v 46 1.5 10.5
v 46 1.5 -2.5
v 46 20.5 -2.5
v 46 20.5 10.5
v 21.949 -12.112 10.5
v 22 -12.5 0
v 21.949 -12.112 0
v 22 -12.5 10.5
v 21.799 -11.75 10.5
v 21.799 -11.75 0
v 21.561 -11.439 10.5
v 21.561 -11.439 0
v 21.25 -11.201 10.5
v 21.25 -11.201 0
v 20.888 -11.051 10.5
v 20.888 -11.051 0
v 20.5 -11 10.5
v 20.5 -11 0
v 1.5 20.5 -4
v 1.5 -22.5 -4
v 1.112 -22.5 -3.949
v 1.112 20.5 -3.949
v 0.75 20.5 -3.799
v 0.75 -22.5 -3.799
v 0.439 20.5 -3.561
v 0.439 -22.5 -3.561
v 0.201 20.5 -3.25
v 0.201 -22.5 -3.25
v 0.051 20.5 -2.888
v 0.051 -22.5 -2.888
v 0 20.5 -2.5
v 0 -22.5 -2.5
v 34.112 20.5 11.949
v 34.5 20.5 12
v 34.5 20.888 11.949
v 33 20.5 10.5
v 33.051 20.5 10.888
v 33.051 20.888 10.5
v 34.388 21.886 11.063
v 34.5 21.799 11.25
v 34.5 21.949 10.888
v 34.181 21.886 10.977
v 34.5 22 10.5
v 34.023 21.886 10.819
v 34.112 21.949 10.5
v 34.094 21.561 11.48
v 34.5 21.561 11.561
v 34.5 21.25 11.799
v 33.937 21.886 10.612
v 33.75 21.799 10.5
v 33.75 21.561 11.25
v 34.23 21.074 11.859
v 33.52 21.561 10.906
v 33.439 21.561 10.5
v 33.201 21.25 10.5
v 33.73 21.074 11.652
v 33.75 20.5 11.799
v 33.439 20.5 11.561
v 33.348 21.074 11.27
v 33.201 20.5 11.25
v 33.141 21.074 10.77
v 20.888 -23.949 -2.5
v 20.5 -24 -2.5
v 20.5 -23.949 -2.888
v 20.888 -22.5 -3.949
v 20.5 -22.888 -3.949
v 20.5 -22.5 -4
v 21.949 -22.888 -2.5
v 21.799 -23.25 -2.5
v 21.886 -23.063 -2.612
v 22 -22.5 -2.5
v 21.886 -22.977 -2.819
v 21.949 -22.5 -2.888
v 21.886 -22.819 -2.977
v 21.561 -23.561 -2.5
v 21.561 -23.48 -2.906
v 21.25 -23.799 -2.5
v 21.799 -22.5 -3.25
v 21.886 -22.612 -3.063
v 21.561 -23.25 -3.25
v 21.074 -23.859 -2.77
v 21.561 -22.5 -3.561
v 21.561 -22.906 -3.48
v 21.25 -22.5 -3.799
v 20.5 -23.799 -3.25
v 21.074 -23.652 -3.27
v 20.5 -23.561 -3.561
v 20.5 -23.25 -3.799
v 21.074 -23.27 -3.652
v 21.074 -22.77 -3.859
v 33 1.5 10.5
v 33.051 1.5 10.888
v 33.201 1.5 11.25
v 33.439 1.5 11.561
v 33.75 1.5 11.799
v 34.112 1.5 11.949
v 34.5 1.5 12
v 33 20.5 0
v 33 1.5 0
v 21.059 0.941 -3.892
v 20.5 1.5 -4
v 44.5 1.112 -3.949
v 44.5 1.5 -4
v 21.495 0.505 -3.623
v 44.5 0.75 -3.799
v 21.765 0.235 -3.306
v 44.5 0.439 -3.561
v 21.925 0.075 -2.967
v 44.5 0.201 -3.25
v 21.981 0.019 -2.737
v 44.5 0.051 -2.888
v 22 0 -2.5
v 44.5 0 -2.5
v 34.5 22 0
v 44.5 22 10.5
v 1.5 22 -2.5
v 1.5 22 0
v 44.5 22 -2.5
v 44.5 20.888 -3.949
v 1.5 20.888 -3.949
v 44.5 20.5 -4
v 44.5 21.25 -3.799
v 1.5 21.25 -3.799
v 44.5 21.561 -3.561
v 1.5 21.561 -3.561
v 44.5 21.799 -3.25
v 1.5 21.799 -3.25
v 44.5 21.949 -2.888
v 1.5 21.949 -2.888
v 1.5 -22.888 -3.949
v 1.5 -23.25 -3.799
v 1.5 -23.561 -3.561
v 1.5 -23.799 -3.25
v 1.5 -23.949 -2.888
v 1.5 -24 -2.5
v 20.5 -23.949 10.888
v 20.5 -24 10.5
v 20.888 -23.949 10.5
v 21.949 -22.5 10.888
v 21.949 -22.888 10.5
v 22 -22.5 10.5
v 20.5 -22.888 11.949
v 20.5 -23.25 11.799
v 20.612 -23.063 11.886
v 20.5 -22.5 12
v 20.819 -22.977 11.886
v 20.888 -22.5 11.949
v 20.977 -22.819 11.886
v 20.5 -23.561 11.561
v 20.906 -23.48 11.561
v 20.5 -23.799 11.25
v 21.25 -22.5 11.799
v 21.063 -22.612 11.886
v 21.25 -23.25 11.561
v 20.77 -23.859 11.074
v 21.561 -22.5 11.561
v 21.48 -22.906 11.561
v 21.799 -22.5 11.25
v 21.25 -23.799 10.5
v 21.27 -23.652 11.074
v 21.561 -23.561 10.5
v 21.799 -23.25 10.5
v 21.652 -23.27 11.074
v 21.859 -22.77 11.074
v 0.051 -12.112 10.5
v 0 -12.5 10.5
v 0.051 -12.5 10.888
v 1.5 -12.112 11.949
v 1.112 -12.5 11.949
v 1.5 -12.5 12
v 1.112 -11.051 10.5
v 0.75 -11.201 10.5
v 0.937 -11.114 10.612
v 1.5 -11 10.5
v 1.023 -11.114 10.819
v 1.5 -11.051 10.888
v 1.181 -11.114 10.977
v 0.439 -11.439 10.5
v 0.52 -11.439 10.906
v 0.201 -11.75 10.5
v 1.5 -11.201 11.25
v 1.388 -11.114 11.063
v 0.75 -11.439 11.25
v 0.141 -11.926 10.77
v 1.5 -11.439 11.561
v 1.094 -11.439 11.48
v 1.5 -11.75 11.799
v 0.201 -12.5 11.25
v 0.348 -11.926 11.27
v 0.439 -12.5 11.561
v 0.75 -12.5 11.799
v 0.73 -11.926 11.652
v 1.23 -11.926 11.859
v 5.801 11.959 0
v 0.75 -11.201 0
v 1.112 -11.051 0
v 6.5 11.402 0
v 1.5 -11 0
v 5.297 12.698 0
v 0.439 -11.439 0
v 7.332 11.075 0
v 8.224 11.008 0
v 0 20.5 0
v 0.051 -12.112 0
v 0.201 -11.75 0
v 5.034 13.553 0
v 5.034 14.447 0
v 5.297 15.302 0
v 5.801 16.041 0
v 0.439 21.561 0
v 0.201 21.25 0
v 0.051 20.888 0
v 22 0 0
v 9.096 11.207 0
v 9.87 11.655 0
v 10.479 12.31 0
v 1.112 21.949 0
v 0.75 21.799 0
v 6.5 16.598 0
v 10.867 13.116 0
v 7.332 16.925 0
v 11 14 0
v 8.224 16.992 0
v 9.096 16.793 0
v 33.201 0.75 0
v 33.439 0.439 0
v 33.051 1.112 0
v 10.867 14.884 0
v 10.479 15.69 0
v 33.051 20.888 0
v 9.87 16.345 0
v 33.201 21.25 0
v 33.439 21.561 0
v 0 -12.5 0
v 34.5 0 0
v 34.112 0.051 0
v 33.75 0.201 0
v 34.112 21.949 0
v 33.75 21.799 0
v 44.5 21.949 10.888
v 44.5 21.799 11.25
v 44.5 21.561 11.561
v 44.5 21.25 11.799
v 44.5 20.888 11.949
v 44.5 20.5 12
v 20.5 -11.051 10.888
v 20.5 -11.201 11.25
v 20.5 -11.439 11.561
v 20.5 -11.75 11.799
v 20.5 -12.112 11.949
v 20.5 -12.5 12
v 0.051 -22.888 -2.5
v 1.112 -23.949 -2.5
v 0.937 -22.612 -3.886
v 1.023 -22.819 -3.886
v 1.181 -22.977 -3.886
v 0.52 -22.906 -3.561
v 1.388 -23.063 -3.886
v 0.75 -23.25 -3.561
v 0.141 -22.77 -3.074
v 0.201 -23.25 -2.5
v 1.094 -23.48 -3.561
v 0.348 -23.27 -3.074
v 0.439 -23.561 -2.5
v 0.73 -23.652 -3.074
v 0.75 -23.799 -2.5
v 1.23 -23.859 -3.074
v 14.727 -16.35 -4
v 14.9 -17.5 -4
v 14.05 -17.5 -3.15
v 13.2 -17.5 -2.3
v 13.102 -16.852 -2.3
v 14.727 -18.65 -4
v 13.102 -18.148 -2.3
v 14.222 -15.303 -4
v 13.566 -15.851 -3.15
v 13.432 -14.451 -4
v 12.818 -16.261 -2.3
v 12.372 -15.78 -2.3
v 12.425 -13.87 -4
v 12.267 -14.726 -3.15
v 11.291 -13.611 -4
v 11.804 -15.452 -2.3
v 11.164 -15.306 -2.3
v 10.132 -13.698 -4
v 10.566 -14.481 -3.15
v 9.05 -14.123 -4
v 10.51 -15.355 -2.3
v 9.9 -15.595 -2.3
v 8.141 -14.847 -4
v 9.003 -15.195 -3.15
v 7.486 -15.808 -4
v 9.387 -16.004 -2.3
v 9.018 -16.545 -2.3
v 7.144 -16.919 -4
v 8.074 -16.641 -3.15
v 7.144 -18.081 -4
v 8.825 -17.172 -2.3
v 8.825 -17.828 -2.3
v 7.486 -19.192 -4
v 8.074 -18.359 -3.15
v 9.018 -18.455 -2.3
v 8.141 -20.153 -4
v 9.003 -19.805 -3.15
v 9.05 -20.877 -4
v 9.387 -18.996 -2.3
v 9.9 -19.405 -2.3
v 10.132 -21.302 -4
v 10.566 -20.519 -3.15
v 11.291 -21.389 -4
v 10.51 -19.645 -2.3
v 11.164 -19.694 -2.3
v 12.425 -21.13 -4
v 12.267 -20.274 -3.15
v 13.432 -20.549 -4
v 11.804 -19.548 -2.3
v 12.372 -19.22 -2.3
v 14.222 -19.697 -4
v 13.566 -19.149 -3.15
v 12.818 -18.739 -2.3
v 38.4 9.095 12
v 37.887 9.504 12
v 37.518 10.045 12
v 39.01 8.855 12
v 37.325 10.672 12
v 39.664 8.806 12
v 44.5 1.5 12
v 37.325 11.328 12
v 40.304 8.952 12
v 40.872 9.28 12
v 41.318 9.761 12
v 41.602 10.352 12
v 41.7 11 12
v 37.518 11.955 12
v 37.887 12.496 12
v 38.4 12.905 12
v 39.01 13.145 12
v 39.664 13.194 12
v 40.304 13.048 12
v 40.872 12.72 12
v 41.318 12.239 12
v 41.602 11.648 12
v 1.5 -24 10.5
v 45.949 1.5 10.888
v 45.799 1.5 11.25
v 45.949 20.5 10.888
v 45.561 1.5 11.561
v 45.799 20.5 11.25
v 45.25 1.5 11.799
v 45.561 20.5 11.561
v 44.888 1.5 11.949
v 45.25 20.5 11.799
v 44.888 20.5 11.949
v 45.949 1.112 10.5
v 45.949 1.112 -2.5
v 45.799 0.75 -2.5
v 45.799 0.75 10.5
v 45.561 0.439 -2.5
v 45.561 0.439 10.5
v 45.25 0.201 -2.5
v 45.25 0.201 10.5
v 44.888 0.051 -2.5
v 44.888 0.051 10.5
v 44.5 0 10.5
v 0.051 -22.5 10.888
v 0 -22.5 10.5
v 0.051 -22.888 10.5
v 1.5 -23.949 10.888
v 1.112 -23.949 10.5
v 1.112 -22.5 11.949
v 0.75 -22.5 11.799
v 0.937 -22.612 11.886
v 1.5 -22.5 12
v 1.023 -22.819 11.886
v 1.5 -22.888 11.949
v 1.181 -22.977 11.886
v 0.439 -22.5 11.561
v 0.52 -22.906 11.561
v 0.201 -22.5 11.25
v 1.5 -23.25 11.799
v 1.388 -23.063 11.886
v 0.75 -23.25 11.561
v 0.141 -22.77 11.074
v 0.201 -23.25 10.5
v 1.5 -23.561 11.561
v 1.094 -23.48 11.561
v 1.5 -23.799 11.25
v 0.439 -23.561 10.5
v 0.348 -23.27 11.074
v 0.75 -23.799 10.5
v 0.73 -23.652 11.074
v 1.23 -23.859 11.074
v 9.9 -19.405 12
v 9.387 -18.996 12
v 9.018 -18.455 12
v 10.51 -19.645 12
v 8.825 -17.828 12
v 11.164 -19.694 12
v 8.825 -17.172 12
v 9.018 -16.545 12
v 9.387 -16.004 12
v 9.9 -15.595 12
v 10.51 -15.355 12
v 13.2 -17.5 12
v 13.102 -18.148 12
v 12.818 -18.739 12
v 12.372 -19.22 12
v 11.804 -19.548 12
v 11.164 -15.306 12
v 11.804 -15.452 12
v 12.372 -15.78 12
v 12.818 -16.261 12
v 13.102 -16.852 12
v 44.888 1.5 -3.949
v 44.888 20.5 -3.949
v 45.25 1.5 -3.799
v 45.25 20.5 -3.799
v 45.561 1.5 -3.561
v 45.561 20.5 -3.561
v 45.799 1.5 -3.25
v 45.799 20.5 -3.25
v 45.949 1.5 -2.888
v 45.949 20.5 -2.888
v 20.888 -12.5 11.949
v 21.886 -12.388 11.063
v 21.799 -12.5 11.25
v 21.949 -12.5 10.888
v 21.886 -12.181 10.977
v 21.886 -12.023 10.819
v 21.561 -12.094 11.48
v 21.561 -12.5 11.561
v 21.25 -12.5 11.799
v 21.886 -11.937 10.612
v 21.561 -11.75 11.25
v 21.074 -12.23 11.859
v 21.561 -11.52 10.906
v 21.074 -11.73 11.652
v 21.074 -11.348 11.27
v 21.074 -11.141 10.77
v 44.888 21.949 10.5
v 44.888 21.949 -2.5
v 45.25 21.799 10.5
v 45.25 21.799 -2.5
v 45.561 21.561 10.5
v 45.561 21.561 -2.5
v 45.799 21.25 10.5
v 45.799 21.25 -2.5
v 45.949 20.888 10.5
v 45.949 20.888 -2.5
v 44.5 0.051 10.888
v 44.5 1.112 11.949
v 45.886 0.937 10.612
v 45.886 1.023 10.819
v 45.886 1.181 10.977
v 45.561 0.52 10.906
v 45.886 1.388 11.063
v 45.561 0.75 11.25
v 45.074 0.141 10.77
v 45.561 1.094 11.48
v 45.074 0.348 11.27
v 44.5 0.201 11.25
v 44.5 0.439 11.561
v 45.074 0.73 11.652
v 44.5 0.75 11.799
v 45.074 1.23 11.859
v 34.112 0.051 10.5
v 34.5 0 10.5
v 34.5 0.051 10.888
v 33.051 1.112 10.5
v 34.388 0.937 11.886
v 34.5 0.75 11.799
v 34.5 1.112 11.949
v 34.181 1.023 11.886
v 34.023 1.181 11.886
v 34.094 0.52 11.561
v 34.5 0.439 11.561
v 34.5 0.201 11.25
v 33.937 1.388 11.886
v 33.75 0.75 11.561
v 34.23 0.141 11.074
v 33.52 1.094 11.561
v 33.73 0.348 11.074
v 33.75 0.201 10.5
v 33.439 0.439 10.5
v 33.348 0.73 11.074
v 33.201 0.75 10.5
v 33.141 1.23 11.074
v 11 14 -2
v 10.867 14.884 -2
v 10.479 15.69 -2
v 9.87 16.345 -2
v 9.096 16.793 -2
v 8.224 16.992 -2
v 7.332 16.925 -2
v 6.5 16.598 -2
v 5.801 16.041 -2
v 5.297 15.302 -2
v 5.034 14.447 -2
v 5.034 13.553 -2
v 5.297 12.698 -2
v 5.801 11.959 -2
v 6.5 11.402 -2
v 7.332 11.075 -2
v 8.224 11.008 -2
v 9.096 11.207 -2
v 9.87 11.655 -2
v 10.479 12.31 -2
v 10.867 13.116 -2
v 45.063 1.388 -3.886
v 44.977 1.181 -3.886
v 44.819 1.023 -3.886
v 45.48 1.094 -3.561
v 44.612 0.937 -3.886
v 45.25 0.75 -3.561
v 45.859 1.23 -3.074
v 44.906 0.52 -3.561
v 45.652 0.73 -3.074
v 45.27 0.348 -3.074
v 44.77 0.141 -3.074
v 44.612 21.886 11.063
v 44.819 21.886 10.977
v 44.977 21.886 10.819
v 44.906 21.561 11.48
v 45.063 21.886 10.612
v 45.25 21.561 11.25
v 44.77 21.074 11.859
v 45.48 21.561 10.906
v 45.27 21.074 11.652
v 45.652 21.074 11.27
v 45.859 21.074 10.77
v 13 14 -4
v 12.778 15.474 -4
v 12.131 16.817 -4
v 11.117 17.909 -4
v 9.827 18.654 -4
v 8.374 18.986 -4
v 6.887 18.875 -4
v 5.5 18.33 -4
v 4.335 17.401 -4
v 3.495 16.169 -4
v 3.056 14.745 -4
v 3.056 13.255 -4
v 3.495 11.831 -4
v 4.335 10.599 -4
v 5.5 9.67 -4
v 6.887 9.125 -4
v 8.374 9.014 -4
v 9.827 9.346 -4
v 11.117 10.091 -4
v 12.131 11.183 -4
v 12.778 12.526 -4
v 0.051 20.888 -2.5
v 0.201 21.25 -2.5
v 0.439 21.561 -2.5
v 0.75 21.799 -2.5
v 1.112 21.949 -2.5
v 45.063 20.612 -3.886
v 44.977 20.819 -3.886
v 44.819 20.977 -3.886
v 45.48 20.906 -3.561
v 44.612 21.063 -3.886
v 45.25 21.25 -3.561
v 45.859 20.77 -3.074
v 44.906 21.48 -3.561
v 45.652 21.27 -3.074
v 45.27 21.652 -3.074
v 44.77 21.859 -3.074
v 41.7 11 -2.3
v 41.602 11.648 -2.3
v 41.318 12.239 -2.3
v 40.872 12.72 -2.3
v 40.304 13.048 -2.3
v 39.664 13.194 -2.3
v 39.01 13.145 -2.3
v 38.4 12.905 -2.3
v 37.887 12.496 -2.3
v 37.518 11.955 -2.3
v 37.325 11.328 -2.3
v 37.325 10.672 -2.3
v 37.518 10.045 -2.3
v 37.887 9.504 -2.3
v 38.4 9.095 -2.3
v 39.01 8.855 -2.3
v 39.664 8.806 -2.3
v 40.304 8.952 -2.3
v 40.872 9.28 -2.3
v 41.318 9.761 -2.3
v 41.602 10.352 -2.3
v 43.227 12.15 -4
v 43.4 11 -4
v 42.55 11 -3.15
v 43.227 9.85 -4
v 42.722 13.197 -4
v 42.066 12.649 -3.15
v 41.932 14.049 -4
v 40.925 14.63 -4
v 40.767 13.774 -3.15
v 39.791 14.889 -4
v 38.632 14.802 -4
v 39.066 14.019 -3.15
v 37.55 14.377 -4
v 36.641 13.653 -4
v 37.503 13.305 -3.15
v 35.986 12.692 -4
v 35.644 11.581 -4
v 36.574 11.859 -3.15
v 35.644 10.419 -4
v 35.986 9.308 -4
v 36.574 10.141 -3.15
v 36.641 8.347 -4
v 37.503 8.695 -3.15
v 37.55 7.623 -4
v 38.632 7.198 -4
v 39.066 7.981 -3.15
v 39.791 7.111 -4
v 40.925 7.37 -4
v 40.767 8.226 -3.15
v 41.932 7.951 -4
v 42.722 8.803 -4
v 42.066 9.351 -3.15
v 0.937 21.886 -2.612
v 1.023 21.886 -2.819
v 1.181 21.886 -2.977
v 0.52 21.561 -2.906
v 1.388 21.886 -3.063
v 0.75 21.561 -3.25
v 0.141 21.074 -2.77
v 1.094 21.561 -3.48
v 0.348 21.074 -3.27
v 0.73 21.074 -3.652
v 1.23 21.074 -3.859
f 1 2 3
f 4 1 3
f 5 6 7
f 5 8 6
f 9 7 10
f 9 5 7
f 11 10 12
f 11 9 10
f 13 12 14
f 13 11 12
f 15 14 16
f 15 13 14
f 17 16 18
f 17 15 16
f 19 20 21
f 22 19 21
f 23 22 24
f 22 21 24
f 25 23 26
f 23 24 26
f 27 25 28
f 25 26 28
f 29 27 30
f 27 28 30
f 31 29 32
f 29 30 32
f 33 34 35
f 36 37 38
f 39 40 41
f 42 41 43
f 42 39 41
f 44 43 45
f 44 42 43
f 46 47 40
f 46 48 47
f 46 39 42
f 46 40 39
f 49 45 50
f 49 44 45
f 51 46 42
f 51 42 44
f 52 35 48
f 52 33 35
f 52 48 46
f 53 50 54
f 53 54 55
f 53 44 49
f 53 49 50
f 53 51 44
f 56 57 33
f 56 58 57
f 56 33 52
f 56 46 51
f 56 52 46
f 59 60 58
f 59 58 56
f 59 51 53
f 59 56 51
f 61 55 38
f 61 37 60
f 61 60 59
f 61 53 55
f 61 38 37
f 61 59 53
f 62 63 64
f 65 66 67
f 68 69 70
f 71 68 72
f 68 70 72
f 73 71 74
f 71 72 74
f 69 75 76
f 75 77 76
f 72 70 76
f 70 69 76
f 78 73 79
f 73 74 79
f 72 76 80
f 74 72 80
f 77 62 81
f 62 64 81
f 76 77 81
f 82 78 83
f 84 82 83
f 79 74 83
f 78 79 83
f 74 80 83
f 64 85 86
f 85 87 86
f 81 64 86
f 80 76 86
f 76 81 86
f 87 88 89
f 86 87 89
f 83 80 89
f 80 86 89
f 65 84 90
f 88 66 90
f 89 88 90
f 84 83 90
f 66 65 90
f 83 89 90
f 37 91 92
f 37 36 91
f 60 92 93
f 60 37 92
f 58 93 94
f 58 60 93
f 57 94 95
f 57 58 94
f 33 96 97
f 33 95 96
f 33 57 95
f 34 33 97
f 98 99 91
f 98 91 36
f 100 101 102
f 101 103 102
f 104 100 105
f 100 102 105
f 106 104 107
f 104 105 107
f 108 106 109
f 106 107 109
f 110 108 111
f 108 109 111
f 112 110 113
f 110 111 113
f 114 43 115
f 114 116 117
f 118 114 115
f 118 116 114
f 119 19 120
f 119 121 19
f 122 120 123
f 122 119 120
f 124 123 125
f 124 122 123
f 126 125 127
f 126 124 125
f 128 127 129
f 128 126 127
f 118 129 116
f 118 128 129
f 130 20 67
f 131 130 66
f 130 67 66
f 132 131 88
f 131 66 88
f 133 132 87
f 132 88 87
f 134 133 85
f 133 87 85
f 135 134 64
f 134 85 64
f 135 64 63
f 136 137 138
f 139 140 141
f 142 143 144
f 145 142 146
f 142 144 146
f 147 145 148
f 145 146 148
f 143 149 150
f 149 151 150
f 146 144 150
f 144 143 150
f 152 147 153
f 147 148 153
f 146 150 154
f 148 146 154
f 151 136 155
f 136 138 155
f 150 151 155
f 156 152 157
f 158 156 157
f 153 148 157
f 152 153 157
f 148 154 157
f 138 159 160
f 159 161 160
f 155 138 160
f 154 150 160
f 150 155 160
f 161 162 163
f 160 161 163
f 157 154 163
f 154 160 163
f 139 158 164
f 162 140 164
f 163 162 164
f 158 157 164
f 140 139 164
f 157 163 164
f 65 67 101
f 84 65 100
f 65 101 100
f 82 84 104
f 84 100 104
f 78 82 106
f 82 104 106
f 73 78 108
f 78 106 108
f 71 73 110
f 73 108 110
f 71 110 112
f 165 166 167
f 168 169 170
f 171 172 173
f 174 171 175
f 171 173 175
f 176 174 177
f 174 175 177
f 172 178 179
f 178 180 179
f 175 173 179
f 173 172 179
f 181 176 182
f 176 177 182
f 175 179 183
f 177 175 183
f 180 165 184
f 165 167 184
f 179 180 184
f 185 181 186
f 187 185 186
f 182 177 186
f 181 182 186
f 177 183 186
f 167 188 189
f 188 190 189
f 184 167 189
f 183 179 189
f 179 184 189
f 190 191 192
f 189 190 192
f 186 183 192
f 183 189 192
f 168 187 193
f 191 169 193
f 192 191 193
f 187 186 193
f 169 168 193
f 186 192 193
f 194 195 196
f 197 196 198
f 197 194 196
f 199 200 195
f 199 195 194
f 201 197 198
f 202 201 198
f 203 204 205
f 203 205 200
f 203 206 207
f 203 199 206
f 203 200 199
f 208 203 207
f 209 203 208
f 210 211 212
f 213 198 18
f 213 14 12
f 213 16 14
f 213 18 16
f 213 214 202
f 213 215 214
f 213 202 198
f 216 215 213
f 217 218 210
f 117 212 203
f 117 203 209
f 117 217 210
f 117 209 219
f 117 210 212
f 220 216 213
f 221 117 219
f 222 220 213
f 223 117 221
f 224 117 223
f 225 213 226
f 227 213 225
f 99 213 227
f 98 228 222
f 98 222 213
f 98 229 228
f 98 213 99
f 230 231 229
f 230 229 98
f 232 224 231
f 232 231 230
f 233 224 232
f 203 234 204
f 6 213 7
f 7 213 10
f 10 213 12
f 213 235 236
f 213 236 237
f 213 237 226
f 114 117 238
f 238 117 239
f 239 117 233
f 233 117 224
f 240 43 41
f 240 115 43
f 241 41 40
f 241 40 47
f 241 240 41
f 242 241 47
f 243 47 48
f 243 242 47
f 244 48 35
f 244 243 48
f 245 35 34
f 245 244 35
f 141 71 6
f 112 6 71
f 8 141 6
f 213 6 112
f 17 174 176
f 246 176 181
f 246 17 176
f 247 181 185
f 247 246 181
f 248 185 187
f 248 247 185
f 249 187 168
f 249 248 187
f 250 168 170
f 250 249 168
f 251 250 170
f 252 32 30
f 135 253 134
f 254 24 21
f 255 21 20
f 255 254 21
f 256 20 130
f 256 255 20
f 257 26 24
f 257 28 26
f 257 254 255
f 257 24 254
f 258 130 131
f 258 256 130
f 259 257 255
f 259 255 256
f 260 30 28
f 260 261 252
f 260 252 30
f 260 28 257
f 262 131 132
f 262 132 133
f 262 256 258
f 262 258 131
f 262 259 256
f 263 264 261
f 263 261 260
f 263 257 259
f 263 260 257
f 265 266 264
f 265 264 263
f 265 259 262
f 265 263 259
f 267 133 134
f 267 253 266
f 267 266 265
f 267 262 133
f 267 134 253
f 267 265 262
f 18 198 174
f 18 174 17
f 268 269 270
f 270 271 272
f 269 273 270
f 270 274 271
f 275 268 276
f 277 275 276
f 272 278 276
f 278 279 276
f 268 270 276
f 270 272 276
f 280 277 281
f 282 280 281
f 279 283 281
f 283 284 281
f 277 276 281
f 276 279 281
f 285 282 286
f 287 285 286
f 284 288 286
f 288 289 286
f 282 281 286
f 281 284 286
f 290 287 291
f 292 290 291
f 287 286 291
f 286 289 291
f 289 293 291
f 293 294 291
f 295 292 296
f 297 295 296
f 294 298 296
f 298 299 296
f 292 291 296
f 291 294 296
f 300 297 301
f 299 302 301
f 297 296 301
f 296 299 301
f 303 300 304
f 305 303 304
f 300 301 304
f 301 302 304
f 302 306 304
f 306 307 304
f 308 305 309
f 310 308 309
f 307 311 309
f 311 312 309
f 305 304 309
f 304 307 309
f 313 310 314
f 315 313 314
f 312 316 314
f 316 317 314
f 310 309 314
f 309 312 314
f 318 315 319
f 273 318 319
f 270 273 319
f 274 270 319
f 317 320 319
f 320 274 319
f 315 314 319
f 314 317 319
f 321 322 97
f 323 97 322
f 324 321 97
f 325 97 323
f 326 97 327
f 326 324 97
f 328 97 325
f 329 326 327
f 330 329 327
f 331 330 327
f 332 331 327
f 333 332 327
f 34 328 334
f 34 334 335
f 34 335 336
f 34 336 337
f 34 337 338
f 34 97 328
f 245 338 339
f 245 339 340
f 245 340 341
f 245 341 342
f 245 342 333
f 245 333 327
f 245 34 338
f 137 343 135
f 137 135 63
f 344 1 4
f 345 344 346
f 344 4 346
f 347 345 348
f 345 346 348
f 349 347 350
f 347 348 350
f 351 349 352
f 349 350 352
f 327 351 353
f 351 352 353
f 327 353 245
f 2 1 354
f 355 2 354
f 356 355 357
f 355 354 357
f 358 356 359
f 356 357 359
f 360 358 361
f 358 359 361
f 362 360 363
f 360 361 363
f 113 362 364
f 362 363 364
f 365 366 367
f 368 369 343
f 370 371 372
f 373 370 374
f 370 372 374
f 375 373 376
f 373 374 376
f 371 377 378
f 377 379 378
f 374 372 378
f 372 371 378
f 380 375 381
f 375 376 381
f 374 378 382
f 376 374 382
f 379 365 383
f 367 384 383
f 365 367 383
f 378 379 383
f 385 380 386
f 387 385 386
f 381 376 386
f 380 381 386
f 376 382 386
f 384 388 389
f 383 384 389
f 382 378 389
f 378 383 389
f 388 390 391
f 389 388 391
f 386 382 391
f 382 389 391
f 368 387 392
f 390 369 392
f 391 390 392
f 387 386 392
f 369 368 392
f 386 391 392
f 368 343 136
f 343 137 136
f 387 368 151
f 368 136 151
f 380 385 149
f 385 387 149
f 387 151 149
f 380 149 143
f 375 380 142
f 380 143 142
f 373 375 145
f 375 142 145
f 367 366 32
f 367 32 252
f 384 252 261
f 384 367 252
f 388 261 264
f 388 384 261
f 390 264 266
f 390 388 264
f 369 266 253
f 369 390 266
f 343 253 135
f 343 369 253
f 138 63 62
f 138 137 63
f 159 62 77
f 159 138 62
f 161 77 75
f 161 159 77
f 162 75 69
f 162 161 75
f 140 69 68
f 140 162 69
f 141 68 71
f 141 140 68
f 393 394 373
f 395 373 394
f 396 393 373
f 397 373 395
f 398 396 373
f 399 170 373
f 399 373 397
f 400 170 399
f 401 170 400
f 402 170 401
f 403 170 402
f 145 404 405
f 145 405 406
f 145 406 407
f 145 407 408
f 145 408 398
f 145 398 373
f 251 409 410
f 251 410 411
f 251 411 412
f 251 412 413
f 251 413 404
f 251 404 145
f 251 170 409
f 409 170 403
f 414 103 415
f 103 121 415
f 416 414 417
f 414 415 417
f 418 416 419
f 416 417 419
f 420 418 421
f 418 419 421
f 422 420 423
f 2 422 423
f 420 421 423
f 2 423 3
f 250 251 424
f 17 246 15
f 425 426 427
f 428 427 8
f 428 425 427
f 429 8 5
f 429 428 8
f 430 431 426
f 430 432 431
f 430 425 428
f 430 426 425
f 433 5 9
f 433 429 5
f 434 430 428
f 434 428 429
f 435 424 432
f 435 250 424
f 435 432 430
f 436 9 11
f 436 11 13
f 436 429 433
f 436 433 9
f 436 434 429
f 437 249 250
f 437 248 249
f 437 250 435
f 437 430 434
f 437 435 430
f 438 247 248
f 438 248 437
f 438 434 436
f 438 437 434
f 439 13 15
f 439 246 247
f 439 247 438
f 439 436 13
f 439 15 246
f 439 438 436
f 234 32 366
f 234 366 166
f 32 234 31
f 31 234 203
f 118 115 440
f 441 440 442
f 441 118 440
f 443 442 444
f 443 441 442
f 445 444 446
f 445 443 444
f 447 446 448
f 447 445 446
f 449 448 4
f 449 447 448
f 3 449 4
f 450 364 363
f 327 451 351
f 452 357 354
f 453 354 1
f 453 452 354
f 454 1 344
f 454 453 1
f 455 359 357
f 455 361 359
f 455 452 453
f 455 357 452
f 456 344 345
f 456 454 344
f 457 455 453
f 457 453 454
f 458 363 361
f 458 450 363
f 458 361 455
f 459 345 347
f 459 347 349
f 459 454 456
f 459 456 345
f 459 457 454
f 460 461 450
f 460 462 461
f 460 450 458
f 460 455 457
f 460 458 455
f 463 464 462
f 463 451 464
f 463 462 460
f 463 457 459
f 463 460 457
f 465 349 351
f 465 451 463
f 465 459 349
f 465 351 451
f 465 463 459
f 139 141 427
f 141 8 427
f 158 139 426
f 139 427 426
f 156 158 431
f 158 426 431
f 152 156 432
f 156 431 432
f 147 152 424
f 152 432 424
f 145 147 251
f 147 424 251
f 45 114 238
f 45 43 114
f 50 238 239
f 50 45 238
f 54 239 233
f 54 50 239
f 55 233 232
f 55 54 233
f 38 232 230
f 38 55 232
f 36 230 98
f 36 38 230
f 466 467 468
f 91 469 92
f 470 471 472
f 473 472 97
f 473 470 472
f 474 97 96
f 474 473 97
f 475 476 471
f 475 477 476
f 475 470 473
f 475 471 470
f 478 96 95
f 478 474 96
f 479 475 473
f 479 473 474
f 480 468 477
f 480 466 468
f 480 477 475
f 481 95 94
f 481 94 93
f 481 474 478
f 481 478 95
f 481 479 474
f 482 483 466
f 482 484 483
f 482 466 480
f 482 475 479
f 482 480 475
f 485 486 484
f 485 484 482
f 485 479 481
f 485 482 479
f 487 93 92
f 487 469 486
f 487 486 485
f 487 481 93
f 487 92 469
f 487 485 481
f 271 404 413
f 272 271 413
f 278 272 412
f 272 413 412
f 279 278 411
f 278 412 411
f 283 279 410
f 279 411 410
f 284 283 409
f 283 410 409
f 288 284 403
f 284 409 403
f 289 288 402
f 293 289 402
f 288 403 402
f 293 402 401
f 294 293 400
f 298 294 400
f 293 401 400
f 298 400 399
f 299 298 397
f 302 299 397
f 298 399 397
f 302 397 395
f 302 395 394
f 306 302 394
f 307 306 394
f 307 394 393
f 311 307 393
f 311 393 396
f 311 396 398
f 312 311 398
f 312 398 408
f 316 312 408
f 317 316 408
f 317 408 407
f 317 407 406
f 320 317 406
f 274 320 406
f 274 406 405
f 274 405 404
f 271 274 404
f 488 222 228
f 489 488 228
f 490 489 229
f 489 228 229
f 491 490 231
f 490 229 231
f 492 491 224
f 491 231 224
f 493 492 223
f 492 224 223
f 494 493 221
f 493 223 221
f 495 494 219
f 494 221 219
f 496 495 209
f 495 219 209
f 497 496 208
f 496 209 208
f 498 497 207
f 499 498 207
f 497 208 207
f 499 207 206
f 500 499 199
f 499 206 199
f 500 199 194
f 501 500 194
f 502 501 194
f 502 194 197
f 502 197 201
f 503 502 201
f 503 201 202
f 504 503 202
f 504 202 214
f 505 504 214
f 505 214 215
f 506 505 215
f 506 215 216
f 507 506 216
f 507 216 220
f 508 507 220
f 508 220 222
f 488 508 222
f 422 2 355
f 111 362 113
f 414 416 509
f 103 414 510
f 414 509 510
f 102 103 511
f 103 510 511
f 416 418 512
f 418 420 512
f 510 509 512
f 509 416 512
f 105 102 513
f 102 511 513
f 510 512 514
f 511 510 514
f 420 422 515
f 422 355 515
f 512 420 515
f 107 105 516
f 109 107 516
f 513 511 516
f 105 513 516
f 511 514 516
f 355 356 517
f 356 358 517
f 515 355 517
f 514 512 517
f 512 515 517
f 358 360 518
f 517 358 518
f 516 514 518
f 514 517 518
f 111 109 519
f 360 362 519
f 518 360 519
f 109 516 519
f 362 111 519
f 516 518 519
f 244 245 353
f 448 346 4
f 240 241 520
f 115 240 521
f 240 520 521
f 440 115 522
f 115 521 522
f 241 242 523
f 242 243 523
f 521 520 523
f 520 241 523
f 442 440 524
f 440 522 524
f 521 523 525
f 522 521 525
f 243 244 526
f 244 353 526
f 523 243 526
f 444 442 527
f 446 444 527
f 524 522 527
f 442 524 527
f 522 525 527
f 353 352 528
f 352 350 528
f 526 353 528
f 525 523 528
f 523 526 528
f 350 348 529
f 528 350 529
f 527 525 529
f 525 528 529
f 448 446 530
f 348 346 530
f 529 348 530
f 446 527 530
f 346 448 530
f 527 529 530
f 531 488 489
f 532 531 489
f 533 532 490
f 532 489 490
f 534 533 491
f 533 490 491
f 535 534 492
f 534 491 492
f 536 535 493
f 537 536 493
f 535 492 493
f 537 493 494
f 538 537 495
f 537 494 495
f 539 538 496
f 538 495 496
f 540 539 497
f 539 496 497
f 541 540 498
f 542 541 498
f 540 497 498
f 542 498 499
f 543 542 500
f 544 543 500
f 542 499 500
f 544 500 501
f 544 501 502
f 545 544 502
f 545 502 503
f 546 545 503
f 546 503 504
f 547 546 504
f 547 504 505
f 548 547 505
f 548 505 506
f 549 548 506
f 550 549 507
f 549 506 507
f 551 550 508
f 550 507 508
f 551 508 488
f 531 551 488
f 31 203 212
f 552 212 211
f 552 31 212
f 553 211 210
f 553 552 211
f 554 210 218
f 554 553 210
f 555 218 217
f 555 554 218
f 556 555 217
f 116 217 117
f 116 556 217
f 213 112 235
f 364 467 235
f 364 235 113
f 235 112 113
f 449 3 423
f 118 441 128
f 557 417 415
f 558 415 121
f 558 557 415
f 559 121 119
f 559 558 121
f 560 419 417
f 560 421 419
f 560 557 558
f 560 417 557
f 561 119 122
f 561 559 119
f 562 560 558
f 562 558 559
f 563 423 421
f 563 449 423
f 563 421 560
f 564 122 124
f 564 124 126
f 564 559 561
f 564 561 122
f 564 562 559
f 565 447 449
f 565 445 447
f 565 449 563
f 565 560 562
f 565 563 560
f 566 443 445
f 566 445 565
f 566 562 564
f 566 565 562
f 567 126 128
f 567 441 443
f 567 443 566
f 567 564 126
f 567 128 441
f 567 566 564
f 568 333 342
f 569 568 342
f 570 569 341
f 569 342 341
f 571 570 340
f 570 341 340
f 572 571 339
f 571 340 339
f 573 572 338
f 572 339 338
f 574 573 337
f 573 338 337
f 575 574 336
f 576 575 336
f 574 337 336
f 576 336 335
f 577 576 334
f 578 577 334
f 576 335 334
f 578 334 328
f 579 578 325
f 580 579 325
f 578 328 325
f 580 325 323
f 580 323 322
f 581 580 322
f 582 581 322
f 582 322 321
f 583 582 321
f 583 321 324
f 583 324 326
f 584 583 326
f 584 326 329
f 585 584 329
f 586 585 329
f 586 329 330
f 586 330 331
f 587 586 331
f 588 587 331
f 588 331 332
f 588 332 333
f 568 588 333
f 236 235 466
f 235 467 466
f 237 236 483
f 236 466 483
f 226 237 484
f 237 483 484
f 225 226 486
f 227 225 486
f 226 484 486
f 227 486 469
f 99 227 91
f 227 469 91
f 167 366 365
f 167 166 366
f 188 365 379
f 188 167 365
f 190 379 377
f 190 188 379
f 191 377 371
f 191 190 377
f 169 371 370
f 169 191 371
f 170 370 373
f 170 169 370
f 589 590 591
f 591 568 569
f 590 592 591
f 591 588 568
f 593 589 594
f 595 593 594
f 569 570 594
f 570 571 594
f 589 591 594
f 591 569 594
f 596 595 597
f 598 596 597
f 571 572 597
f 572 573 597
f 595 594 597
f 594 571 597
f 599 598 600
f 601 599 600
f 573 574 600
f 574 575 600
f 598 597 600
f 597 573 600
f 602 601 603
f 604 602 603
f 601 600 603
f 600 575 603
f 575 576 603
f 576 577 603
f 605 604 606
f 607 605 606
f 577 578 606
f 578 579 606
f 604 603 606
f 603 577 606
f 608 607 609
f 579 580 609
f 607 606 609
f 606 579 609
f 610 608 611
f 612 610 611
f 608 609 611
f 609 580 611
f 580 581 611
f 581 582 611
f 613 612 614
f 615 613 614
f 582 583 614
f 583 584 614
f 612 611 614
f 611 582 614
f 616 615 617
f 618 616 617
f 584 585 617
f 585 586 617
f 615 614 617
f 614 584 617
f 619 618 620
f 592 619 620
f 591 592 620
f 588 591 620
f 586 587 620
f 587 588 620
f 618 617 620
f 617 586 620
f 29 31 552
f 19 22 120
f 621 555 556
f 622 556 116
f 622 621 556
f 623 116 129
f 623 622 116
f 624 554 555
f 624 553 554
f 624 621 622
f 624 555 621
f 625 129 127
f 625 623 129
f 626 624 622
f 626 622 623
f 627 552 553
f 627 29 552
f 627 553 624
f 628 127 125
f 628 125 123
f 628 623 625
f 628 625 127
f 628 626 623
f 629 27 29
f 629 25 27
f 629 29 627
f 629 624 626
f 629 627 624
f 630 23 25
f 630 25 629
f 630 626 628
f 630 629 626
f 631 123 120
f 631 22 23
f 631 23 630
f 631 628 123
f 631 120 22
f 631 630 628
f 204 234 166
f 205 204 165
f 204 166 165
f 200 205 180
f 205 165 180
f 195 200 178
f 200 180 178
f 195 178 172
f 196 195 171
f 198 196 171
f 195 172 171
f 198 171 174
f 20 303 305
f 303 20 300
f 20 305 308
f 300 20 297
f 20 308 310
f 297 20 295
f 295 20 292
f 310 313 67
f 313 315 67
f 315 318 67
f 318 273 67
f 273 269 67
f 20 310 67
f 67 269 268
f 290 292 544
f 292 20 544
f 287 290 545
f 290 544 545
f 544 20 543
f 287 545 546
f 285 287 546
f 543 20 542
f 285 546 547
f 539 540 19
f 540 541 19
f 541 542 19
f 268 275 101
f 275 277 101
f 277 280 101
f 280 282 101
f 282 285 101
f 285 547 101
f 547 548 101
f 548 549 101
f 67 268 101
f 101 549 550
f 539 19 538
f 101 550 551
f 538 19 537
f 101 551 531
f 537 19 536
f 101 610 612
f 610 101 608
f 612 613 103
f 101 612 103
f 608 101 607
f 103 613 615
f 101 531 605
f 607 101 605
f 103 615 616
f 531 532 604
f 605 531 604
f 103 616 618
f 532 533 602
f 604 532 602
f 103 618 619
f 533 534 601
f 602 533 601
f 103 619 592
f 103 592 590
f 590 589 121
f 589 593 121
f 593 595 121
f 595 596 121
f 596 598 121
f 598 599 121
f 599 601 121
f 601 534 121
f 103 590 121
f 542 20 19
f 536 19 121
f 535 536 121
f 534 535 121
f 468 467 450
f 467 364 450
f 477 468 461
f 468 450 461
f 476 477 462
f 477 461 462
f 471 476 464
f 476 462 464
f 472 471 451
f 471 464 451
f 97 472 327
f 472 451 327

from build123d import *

# Parameters (mm, degrees)
RECTANGLE003_W       = 22
RECTANGLE003_H       = 13
PAD_DEPTH            = 12
RECTANGLE002_FACE1_W = 22
RECTANGLE002_FACE1_H = 24
PAD002_DEPTH         = 4
RECTANGLE_FACE1_W    = 46
RECTANGLE_FACE1_H    = 22
PAD003_DEPTH         = 4
RECTANGLE001_W       = 13
RECTANGLE001_H       = 22
PAD004_DEPTH         = 12
CIRCLE002_R          = 2.2
POCKET_DEPTH         = 22
CIRCLE_EDGE1_R       = 3
POCKET001_DEPTH      = 5
CIRCLE001_R          = 2.2
POCKET002_DEPTH      = 22
POCKET003_DEPTH      = 22
POCKET004_DEPTH      = 22
CHAMFER_SIZE         = 2
CHAMFER001_SIZE      = 1.7
CHAMFER002_SIZE      = 1.7
FILLET_R             = 1.5


with BuildPart() as part:
    # Rectangle003 → Pad (new body)
    with BuildSketch(Plane(origin=(0, -24, 0), x_dir=(1, 0, 0), z_dir=(0, 0, 1))):
        with Locations((11, 6.5)):
            Rectangle(RECTANGLE003_W, RECTANGLE003_H)
    extrude(amount=PAD_DEPTH)

    # Rectangle002 Face1 → Pad002 (add)
    with BuildSketch(Plane(origin=(0, -24, 0), x_dir=(1, 0, 0), z_dir=(0, 0, 1))):
        with Locations((11, 12)):
            Rectangle(RECTANGLE002_FACE1_W, RECTANGLE002_FACE1_H)
    extrude(amount=-PAD002_DEPTH)

    # Rectangle Face1 → Pad003 (add)
    with BuildSketch(Plane.XY):
        with Locations((23, 11)):
            Rectangle(RECTANGLE_FACE1_W, RECTANGLE_FACE1_H)
    extrude(amount=-PAD003_DEPTH)

    # Rectangle001 → Pad004 (join)
    with BuildSketch(Plane(origin=(33, 0, 0), x_dir=(1, 0, 0), z_dir=(0, 0, 1))):
        with Locations((6.5, 11)):
            Rectangle(RECTANGLE001_W, RECTANGLE001_H)
    extrude(amount=PAD004_DEPTH)

    # Circle002 → Pocket (cut)
    with BuildSketch(Plane(origin=(11, -17.5, 0), x_dir=(1, 0, 0), z_dir=(0, 0, 1))):
        Circle(CIRCLE002_R)
    extrude(amount=-POCKET_DEPTH, mode=Mode.SUBTRACT)

    # Circle Edge1 → Pocket001 (cut)
    with BuildSketch(Plane(origin=(8, 14, 0), x_dir=(1, 0, 0), z_dir=(0, 0, 1))):
        Circle(CIRCLE_EDGE1_R)
    extrude(amount=-POCKET001_DEPTH, mode=Mode.SUBTRACT)

    # Circle001 → Pocket002 (cut)
    with BuildSketch(Plane(origin=(39.5, 11, 0), x_dir=(1, 0, 0), z_dir=(0, 0, 1))):
        Circle(CIRCLE001_R)
    extrude(amount=-POCKET002_DEPTH, mode=Mode.SUBTRACT)

    # Circle001 → Pocket003 (cut)
    with BuildSketch(Plane(origin=(39.5, 11, 0), x_dir=(1, 0, 0), z_dir=(0, 0, 1))):
        Circle(CIRCLE001_R)
    extrude(amount=POCKET003_DEPTH, mode=Mode.SUBTRACT)

    # Circle002 → Pocket004 (cut)
    with BuildSketch(Plane(origin=(11, -17.5, 0), x_dir=(1, 0, 0), z_dir=(0, 0, 1))):
        Circle(CIRCLE002_R)
    extrude(amount=POCKET004_DEPTH, mode=Mode.SUBTRACT)

    # Chamfer
    chamfer_edges = [part.edges().sort_by_distance(p)[0] for p in [
        (5, 14, -4),
    ]]
    chamfer(chamfer_edges, length=CHAMFER_SIZE)

    # Chamfer001
    chamfer001_edges = [part.edges().sort_by_distance(p)[0] for p in [
        (37.3, 11, -4),
    ]]
    chamfer(chamfer001_edges, length=CHAMFER001_SIZE)

    # Chamfer002
    chamfer002_edges = [part.edges().sort_by_distance(p)[0] for p in [
        (8.8, -17.5, -4),
    ]]
    chamfer(chamfer002_edges, length=CHAMFER002_SIZE)

    # Fillet
    fillet_edges = [part.edges().sort_by_distance(p)[0] for p in [
        (0, -24, 4),
        (0, -17.5, 12),
        (0, -11, 6),
        (0, -1, -4),
        (11, -24, -4),
        (22, -24, 4),
        (11, -24, 12),
        (11, -11, 12),
        (22, -17.5, 12),
        (33, 0, 6),
        (39.5, 0, 12),
        (46, 0, 4),
        (46, 11, 12),
        (33, 11, 12),
        (39.5, 22, 12),
        (33, 22, 6),
        (0, 22, -2),
        (22, -11, 6),
        (46, 22, 4),
        (46, 11, -4),
        (23, 22, -4),
        (34, 0, -4),
        (22, -12, -4),
    ]]
    fillet(fillet_edges, radius=FILLET_R)


solid = part.part
